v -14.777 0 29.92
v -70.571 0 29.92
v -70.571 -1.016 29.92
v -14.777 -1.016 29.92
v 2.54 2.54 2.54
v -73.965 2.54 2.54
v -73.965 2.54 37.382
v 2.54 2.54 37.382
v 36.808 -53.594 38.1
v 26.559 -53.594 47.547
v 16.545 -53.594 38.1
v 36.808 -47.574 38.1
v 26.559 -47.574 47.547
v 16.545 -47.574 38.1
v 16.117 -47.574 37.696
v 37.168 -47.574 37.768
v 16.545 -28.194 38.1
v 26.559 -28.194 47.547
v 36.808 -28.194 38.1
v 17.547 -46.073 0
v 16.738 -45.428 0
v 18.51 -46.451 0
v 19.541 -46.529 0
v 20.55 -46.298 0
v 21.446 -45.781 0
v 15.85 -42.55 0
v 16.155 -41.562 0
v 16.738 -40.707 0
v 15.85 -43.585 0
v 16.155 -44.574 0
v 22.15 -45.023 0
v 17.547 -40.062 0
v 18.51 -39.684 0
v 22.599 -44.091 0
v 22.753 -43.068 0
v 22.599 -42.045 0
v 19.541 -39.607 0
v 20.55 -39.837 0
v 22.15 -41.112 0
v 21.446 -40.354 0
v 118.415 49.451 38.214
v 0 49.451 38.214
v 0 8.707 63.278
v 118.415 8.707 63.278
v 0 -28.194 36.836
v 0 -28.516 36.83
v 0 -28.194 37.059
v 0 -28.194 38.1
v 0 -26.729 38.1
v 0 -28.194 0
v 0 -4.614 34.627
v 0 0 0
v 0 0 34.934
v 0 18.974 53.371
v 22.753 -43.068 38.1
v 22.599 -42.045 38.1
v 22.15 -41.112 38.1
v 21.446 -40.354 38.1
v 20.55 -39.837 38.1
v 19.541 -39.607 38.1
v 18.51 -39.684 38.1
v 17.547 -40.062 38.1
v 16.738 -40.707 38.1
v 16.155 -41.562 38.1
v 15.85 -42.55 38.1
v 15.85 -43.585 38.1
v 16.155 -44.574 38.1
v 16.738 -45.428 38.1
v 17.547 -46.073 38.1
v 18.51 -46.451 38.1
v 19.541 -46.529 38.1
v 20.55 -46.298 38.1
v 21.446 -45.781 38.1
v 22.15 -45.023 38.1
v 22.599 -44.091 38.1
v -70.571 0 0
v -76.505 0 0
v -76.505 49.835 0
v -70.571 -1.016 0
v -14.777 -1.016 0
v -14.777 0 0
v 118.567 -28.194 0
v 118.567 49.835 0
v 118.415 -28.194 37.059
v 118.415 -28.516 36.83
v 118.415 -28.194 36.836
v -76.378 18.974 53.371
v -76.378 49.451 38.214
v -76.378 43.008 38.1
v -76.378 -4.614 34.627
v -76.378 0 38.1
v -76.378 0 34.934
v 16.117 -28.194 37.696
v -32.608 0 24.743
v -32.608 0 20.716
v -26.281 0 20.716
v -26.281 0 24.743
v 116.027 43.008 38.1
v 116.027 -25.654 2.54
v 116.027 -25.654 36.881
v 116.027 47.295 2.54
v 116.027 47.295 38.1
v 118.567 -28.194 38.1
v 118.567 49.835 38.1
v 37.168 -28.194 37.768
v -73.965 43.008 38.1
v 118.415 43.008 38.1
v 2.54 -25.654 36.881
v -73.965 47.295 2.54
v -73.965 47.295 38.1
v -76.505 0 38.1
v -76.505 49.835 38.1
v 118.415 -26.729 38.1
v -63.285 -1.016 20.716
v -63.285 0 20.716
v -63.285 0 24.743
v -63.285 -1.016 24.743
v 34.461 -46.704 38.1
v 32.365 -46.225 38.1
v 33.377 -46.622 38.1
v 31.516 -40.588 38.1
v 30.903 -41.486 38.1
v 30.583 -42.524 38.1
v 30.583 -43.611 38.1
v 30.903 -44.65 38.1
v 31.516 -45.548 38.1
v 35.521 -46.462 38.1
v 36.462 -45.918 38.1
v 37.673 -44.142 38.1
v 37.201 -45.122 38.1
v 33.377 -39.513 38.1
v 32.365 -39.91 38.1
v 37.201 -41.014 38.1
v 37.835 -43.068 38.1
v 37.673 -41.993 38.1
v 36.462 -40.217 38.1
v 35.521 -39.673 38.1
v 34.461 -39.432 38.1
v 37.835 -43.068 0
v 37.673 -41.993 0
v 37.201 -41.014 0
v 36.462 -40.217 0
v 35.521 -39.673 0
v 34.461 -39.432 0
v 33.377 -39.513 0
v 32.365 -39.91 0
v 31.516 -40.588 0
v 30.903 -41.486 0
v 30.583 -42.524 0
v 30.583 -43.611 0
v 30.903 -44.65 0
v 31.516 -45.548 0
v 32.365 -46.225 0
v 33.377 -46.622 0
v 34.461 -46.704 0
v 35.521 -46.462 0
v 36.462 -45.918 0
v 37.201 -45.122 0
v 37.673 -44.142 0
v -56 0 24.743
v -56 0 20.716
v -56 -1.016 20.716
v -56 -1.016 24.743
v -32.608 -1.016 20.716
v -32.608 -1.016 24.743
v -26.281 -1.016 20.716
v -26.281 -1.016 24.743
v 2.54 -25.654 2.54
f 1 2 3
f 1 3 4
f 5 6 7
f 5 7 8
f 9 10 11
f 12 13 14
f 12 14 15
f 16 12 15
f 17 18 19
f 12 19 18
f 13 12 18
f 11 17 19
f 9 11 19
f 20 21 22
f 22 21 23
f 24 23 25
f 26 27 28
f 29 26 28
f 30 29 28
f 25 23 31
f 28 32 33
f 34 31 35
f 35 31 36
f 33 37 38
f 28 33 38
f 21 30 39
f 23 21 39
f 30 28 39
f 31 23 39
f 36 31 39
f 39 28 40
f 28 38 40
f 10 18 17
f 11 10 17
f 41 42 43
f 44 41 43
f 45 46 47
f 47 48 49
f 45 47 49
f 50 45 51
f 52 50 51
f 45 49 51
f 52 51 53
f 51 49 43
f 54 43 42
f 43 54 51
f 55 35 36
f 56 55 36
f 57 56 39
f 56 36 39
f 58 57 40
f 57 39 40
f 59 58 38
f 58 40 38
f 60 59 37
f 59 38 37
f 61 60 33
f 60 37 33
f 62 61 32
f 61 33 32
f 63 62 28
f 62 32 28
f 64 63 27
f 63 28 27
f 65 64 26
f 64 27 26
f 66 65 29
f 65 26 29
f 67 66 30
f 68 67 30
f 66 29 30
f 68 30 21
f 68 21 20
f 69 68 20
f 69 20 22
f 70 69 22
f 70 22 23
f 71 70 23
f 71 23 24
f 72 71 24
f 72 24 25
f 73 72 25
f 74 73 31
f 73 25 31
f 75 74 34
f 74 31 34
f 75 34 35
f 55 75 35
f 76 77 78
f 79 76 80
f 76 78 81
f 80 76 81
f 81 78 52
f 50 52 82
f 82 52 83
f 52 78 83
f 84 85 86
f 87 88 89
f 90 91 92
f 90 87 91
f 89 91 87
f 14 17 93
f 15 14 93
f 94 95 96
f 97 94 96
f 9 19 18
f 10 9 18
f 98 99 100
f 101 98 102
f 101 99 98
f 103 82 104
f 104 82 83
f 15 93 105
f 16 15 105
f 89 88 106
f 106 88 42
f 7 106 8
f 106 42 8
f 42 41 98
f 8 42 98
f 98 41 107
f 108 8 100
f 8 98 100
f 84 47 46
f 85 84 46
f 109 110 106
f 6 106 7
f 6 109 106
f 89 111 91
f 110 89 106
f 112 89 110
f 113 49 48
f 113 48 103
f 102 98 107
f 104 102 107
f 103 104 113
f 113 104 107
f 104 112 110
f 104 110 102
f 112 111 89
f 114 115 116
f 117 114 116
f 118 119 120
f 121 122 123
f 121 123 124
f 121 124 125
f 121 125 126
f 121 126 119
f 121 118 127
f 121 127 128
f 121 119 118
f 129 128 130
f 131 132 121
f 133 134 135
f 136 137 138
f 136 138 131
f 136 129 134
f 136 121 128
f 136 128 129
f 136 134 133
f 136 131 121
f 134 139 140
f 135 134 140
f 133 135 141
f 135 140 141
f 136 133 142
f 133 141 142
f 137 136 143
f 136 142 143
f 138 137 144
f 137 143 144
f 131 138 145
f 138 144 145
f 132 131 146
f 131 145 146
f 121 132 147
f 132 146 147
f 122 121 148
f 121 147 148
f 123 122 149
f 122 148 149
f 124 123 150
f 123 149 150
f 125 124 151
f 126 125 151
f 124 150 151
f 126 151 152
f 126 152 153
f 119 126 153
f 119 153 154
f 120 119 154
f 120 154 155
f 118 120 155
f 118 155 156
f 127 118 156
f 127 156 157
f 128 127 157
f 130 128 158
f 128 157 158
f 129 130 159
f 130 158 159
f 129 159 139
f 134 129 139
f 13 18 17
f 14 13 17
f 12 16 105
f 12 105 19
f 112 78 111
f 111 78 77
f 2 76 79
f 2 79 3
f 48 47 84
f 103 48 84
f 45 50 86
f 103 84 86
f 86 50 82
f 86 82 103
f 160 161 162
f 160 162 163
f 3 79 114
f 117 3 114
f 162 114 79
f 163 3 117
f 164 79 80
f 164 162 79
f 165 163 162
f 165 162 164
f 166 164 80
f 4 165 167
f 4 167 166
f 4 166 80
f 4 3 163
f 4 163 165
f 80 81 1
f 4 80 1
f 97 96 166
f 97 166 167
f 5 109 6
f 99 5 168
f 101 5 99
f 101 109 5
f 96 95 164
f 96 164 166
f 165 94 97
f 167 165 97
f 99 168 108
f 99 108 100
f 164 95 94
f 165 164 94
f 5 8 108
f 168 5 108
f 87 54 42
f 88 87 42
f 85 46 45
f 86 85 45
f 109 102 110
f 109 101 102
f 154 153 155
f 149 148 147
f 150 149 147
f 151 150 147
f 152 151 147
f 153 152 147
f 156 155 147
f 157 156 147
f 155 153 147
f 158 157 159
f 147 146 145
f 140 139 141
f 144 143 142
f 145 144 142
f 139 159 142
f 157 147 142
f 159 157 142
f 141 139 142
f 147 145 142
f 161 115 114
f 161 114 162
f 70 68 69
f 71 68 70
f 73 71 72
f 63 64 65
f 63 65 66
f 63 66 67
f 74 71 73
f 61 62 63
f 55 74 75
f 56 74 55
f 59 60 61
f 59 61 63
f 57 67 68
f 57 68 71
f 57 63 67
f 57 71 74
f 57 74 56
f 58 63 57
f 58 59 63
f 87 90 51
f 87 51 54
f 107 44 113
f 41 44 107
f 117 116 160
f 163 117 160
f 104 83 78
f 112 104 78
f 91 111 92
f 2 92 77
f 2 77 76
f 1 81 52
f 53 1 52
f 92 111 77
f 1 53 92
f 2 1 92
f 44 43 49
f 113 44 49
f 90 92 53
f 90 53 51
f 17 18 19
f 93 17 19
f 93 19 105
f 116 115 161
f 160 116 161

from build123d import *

# Parameters (mm, degrees)
F0_W      = 1.8879286945
F0_H      = 11.4653147757
F0_W_2    = 1.7881840467
F0_H_2    = 24.578695884
F0_W_3    = 13.0486488342
F0_H_3    = 2.4496505503
F1_DEPTH  = 38.1
F2_T      = -2.54
F3_R      = 3.6462481821
F4_DEPTH  = 38.1
F3_R_2    = 3.4707937143
F6_DEPTH  = 118.4148
F10_DEPTH = 76.3778
F11_W     = 55.7948499918
F11_H     = 29.9196355045
F11_W_2   = 7.285926491
F11_H_2   = 4.0264315903
F11_W_3   = 6.327252835
F12_DEPTH = 1.016
F14_DEPTH = 19.3802
F17_DEPTH = 25.4


# Not quite as in the source:
# - the program builds the solid bodies; features that only make, move or delete a surface that nothing else refers to are left out


with BuildPart() as f1:
    # F0 (on Top) → F1 (new body)
    with BuildSketch(Plane.XY):
        Polygon((115.5052706599, 46.1629368365), (0, 46.1629368365), (0, 36.2635403872), (5.0127906725, 33.348493278), (3.9305194266, 31.4873915519), (-2.1358516533, 33.348493278), (-2.1358516533, 46.1629368365), (-73.9798247814, 46.1629368365), (-73.9798247814, 2.8401890304), (-2.1358516533, 2.8401890304), (-2.1358516533, 25.5750287324), (0, 25.5750287324), (0, 0), (32.6135978103, 0), (32.6135978103, -10.8203999698), (36.2712033093, -12.9540003836), (34.8249944744, -15.4332187757), (30.5749002367, -12.9540003836), (30.5749002367, -1.6563893296), (2.5344253518, -1.6563893296), (2.5344253518, -27.0283464342), (30.5749002367, -27.0283464342), (30.5749002367, -18.0092640221), (32.6135978103, -18.0092640221), (32.6135978103, -27.0283464342), (48.8130263984, -27.0283464342), (48.8130263984, -15.5630316585), (50.7009550929, -15.5630316585), (50.7009550929, -27.0283464342), (79.7093436122, -27.0283464342), (79.7093436122, -2.4496505503), (50.7009550929, -2.4496505503), (50.7009550929, -7.0923493578), (52.741076349, -6.0931874175), (53.6812692881, -8.0129038543), (48.8130263984, -10.3971557692), (48.8130263984, 0), (93.6689444834, 0), (97.4417412263, -6.2941650698), (95.5842658877, -7.4075576849), (92.6124379039, -2.4496505503), (81.4975276589, -2.4496505503), (81.4975276589, -27.0283464342), (115.5052706599, -27.0283464342), (115.5052706599, -2.4496505503), (102.4566218257, -2.4496505503), (102.4566218257, 0), (115.5052706599, 0), align=None)
        Polygon((0, 46.1629368365), (0, 49.8348027468), (-76.5047967434, 49.8348027468), (-76.5047967434, 0), (0, 0), (0, 25.5750287324), (-2.1358516533, 25.5750287324), (-2.1358516533, 2.8401890304), (-73.9798247814, 2.8401890304), (-73.9798247814, 46.1629368365), (-2.1358516533, 46.1629368365), (-2.1358516533, 33.348493278), (3.9305194266, 31.4873915519), (5.0127906725, 33.348493278), (0, 36.2635403872), align=None)
        Polygon((32.6135978103, 0), (0, 0), (0, -28.1940009445), (32.6135978103, -28.1940009445), (32.6135978103, -27.0283464342), (32.6135978103, -18.0092640221), (30.5749002367, -18.0092640221), (30.5749002367, -27.0283464342), (2.5344253518, -27.0283464342), (2.5344253518, -1.6563893296), (30.5749002367, -1.6563893296), (30.5749002367, -12.9540003836), (34.8249944744, -15.4332187757), (36.2712033093, -12.9540003836), (32.6135978103, -10.8203999698), align=None)
        with Locations((49.7569907457, -21.2956890464)):
            Rectangle(F0_W, F0_H)
        Polygon((32.6135978103, -28.1940009445), (50.7009550929, -28.1940009445), (50.7009550929, -27.0283464342), (48.8130263984, -27.0283464342), (32.6135978103, -27.0283464342), align=None)
        Polygon((50.7009550929, -2.4496505503), (79.7093436122, -2.4496505503), (81.4975276589, -2.4496505503), (92.6124379039, -2.4496505503), (95.5842658877, -7.4075576849), (97.4417412263, -6.2941650698), (93.6689444834, 0), (48.8130263984, 0), (48.8130263984, -10.3971557692), (53.6812692881, -8.0129038543), (52.741076349, -6.0931874175), (50.7009550929, -7.0923493578), align=None)
        with Locations((80.6034356356, -14.7389984922)):
            Rectangle(F0_W_2, F0_H_2)
        Polygon((118.5672059655, 49.8348027468), (0, 49.8348027468), (0, 46.1629368365), (115.5052706599, 46.1629368365), (115.5052706599, 0), (115.5052706599, -2.4496505503), (115.5052706599, -27.0283464342), (81.4975276589, -27.0283464342), (79.7093436122, -27.0283464342), (50.7009550929, -27.0283464342), (50.7009550929, -28.1940009445), (118.5672059655, -28.1940009445), align=None)
        with Locations((108.9809462428, -1.2248252751)):
            Rectangle(F0_W_3, F0_H_3)
    extrude(amount=F1_DEPTH)

    # F2
    f2_openings = [f1.faces().sort_by_distance(p)[0] for p in [
        (30.819232, 14.934392, 38.1),
    ]]
    offset(amount=F2_T, openings=f2_openings, kind=Kind.INTERSECTION)

    # F5 (on Right) → F6 (join)
    with BuildSketch(Plane.YZ):
        Polygon((8.7074302137, 63.2784813643), (-28.5157766193, 36.8304103613), (49.4514331222, 38.2143817842), align=None)
    extrude(amount=F6_DEPTH)

    # F9 (on face) → F10 (join)
    with BuildSketch(Plane(origin=(0, 0, 0), x_dir=(0, -1, 0), z_dir=(-1, 0, 0))):
        Polygon((-18.9741293217, 53.3712290613), (-49.4514331222, 38.2143817842), (-2.54, 37.3816716864), (-2.54, 38.1), (0, 38.1), (0, 34.9335108109), (4.6135843263, 34.6274210994), align=None)
    extrude(amount=F10_DEPTH)

    # F11 (on face) → F12 (join)
    with BuildSketch(Plane.XZ):
        with Locations((-42.6739454269, 14.9598177522)):
            Rectangle(F11_W, F11_H)
        with Locations((-59.6424844116, 22.7295774966)):
            Rectangle(F11_W_2, F11_H_2, mode=Mode.SUBTRACT)
        with Locations((-29.444238171, 22.7295774966)):
            Rectangle(F11_W_3, F11_H_2, mode=Mode.SUBTRACT)
    extrude(amount=F12_DEPTH)


with BuildPart() as f4:
    # F3 (on Top) → F4 (new body)
    with BuildSketch(Plane.XY):
        with Locations((34.1883972287, -43.0675931275)):
            Circle(F3_R)
    extrude(amount=F4_DEPTH)


with BuildPart() as f4b:
    # F3 (on Top) → F4, piece 2 (new body)
    with BuildSketch(Plane.XY):
        with Locations((19.2820988595, -43.0675931275)):
            Circle(F3_R_2)
    extrude(amount=F4_DEPTH)


with BuildPart() as f14:
    # F13 (on face) → F14 (new body)
    with BuildSketch(Plane.XZ.offset(28.1940009445)):
        Polygon((26.5588965267, 47.5474819541), (16.544852101, 38.1), (36.8077256615, 38.1), align=None)
        Polygon((16.544852101, 38.1), (16.1166600883, 37.6960337162), (37.1683239937, 37.7675965428), (36.8077256615, 38.1), align=None)
    extrude(amount=F14_DEPTH)


with BuildPart() as f17:
    # F13 (on face) → F17 (new body)
    with BuildSketch(Plane.XZ.offset(28.1940009445)):
        Polygon((26.5588965267, 47.5474819541), (16.544852101, 38.1), (36.8077256615, 38.1), align=None)
    extrude(amount=F17_DEPTH)


solid = Compound([f1.part, f4.part, f4b.part, f14.part, f17.part])
